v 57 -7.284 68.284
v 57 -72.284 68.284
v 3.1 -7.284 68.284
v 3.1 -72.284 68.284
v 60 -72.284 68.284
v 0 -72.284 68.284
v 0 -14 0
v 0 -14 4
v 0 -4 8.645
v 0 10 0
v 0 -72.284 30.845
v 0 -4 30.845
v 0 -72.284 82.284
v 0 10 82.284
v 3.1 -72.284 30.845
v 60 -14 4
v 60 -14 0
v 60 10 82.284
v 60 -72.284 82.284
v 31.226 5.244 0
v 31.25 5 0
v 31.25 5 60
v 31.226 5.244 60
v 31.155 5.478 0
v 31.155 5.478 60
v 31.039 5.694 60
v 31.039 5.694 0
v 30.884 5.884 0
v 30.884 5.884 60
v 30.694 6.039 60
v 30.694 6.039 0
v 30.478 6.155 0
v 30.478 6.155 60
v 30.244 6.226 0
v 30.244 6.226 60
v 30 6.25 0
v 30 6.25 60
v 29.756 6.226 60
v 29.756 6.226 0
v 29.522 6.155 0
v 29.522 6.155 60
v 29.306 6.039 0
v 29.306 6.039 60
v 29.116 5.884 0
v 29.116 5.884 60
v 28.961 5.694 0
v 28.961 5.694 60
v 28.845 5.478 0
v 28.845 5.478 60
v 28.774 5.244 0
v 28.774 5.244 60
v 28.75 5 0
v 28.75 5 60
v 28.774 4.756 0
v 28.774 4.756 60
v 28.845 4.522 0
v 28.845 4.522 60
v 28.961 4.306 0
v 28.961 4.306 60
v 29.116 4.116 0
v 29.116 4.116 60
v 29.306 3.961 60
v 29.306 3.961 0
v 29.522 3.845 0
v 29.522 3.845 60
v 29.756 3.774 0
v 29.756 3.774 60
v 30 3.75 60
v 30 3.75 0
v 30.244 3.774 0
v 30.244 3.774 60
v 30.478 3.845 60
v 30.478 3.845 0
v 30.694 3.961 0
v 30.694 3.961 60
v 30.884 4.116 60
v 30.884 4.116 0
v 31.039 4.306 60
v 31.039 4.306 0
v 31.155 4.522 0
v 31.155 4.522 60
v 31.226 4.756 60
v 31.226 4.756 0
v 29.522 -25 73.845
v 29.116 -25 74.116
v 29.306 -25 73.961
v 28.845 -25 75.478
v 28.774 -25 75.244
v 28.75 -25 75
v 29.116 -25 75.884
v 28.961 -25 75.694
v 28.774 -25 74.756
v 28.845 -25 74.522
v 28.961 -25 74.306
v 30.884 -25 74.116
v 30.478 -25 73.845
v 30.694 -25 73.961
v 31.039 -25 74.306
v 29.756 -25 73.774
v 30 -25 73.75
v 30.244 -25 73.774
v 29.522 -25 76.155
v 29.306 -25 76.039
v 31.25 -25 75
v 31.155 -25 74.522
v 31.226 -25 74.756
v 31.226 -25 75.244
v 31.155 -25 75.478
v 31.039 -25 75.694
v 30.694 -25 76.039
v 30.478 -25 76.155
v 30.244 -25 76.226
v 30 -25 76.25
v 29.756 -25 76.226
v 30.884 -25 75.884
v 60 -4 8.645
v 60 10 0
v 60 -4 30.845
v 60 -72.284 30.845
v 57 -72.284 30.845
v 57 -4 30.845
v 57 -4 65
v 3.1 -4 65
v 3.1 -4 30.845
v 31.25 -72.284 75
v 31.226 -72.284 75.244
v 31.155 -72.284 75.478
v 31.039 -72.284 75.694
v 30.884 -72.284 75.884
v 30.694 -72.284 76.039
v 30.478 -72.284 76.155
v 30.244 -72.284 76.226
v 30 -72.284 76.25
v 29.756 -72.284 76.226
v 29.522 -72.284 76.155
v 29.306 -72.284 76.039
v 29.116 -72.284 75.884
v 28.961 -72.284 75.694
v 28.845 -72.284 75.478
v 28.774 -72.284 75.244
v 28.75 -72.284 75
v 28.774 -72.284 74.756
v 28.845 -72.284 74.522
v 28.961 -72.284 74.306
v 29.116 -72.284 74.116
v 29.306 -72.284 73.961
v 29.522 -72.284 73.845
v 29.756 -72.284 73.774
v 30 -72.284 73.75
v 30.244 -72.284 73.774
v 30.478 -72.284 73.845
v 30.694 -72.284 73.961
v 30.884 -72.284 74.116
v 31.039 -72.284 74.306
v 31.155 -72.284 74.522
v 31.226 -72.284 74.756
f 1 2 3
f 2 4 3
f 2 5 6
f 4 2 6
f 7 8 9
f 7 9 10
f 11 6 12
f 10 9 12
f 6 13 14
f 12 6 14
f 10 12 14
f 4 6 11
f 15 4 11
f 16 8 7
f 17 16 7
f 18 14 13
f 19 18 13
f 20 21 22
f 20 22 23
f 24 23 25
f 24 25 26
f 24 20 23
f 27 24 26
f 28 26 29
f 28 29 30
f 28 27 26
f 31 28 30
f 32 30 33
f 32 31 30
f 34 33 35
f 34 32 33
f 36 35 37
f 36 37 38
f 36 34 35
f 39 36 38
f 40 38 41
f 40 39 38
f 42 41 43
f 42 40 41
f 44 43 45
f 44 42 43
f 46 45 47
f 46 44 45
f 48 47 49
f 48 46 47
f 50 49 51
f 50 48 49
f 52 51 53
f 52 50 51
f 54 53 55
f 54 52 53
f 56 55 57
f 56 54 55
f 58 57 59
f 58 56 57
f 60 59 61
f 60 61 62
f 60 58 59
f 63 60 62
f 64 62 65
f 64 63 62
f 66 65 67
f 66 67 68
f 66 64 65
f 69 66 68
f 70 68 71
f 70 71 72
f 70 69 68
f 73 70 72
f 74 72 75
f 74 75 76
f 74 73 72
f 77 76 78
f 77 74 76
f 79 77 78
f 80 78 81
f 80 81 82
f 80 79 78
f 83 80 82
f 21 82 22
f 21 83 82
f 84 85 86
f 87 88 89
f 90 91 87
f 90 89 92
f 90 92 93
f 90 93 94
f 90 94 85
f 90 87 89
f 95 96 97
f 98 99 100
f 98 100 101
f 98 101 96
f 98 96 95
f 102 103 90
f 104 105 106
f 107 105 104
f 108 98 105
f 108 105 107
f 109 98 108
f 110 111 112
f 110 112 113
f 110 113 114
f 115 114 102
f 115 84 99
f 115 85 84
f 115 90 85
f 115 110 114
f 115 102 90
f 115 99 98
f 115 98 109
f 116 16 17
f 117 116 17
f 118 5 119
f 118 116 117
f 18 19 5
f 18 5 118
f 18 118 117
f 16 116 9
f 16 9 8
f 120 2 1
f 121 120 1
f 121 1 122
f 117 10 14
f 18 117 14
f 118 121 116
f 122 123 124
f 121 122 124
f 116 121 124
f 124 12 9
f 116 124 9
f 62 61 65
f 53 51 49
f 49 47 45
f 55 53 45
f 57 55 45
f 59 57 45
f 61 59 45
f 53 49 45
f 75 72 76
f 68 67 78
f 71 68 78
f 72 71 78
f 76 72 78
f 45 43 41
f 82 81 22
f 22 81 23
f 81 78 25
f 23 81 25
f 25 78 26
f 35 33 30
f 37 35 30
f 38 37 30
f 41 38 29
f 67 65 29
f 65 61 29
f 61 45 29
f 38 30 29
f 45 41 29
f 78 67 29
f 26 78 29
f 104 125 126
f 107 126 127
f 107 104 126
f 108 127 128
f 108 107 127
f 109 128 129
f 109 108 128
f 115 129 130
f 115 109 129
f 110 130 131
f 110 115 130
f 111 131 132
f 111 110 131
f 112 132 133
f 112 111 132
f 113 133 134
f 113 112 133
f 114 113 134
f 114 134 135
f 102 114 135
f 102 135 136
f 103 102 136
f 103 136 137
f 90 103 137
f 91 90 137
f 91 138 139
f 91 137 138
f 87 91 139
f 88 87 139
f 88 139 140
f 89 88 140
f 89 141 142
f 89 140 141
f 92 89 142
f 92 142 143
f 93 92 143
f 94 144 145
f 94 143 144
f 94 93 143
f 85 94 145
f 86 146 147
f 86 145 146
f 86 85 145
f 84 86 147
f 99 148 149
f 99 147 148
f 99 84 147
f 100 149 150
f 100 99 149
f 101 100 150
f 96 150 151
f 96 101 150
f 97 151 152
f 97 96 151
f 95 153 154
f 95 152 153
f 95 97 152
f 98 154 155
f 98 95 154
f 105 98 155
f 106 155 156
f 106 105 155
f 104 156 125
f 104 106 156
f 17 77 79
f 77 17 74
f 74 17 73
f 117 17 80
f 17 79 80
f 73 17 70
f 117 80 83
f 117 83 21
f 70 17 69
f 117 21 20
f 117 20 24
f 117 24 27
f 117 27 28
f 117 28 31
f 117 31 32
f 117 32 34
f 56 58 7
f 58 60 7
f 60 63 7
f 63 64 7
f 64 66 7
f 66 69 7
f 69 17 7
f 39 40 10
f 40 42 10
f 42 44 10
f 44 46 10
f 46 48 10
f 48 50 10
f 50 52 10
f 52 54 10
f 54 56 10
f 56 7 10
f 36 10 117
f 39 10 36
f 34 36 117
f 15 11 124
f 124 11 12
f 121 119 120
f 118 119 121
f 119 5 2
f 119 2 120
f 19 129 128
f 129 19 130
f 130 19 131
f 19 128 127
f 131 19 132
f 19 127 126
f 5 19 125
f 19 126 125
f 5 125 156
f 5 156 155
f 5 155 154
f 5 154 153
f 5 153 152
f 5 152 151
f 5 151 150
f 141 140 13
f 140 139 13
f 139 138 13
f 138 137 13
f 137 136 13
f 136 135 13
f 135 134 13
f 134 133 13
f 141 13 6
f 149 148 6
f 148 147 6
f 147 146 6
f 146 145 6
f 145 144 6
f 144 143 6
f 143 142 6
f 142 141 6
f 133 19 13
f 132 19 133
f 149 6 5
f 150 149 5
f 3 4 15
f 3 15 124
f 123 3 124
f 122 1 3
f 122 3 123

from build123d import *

# Parameters (mm, degrees)
F1_DEPTH  = 60
F3_DEPTH  = 3.1
F6_DEPTH  = 3
F8_R      = 1.25
F9_DEPTH  = 100
F10_R     = 1.25
F11_DEPTH = 60


with BuildPart() as f1:
    # F0 (on Right) → F1 (new body)
    with BuildSketch(Plane.YZ):
        Polygon((-4, 0), (0, 0), (10, 0), (10, 4), (10, 82.284271), (-68.284271, 82.284271), (-72.284271, 82.284271), (-72.284271, 72.284271), (-72.284271, 68.284271), (-32.284271, 68.284271), (-7.284271, 68.284271), (-4, 65), (-4, 40), (-4, 8.644639), align=None)
        Polygon((-14, 0), (-4, 0), (-4, 8.644639), (-14, 4), align=None)
    extrude(amount=F1_DEPTH)

    # F2 (on Right) → F3 (join)
    with BuildSketch(Plane.YZ):
        Polygon((-30.521803, 70.845065), (-72.284, 70.845065), (-72.284, 30.845065), (-2.284, 30.845065), (-2.284, 42.845065), (-2.472219, 70.845065), align=None)
    extrude(amount=F3_DEPTH)

    # F5 (on offset) → F6 (join)
    with BuildSketch(Plane.YZ.offset(60)):
        Polygon((-30.521803, 70.845), (-72.284, 70.845), (-72.284, 30.845), (-2.284, 30.845), (-2.284, 42.845), (-2.284, 70.845), align=None)
    extrude(amount=-F6_DEPTH)

    # F8 (on offset) → F9 (cut)
    with BuildSketch(Plane.XZ.offset(25)):
        with Locations((30, 75)):
            Circle(F8_R)
    extrude(amount=F9_DEPTH, mode=Mode.SUBTRACT)

    # F10 (on Top) → F11 (cut)
    with BuildSketch(Plane.XY):
        with Locations((30, 5)):
            Circle(F10_R)
    extrude(amount=F11_DEPTH, mode=Mode.SUBTRACT)


solid = f1.part
